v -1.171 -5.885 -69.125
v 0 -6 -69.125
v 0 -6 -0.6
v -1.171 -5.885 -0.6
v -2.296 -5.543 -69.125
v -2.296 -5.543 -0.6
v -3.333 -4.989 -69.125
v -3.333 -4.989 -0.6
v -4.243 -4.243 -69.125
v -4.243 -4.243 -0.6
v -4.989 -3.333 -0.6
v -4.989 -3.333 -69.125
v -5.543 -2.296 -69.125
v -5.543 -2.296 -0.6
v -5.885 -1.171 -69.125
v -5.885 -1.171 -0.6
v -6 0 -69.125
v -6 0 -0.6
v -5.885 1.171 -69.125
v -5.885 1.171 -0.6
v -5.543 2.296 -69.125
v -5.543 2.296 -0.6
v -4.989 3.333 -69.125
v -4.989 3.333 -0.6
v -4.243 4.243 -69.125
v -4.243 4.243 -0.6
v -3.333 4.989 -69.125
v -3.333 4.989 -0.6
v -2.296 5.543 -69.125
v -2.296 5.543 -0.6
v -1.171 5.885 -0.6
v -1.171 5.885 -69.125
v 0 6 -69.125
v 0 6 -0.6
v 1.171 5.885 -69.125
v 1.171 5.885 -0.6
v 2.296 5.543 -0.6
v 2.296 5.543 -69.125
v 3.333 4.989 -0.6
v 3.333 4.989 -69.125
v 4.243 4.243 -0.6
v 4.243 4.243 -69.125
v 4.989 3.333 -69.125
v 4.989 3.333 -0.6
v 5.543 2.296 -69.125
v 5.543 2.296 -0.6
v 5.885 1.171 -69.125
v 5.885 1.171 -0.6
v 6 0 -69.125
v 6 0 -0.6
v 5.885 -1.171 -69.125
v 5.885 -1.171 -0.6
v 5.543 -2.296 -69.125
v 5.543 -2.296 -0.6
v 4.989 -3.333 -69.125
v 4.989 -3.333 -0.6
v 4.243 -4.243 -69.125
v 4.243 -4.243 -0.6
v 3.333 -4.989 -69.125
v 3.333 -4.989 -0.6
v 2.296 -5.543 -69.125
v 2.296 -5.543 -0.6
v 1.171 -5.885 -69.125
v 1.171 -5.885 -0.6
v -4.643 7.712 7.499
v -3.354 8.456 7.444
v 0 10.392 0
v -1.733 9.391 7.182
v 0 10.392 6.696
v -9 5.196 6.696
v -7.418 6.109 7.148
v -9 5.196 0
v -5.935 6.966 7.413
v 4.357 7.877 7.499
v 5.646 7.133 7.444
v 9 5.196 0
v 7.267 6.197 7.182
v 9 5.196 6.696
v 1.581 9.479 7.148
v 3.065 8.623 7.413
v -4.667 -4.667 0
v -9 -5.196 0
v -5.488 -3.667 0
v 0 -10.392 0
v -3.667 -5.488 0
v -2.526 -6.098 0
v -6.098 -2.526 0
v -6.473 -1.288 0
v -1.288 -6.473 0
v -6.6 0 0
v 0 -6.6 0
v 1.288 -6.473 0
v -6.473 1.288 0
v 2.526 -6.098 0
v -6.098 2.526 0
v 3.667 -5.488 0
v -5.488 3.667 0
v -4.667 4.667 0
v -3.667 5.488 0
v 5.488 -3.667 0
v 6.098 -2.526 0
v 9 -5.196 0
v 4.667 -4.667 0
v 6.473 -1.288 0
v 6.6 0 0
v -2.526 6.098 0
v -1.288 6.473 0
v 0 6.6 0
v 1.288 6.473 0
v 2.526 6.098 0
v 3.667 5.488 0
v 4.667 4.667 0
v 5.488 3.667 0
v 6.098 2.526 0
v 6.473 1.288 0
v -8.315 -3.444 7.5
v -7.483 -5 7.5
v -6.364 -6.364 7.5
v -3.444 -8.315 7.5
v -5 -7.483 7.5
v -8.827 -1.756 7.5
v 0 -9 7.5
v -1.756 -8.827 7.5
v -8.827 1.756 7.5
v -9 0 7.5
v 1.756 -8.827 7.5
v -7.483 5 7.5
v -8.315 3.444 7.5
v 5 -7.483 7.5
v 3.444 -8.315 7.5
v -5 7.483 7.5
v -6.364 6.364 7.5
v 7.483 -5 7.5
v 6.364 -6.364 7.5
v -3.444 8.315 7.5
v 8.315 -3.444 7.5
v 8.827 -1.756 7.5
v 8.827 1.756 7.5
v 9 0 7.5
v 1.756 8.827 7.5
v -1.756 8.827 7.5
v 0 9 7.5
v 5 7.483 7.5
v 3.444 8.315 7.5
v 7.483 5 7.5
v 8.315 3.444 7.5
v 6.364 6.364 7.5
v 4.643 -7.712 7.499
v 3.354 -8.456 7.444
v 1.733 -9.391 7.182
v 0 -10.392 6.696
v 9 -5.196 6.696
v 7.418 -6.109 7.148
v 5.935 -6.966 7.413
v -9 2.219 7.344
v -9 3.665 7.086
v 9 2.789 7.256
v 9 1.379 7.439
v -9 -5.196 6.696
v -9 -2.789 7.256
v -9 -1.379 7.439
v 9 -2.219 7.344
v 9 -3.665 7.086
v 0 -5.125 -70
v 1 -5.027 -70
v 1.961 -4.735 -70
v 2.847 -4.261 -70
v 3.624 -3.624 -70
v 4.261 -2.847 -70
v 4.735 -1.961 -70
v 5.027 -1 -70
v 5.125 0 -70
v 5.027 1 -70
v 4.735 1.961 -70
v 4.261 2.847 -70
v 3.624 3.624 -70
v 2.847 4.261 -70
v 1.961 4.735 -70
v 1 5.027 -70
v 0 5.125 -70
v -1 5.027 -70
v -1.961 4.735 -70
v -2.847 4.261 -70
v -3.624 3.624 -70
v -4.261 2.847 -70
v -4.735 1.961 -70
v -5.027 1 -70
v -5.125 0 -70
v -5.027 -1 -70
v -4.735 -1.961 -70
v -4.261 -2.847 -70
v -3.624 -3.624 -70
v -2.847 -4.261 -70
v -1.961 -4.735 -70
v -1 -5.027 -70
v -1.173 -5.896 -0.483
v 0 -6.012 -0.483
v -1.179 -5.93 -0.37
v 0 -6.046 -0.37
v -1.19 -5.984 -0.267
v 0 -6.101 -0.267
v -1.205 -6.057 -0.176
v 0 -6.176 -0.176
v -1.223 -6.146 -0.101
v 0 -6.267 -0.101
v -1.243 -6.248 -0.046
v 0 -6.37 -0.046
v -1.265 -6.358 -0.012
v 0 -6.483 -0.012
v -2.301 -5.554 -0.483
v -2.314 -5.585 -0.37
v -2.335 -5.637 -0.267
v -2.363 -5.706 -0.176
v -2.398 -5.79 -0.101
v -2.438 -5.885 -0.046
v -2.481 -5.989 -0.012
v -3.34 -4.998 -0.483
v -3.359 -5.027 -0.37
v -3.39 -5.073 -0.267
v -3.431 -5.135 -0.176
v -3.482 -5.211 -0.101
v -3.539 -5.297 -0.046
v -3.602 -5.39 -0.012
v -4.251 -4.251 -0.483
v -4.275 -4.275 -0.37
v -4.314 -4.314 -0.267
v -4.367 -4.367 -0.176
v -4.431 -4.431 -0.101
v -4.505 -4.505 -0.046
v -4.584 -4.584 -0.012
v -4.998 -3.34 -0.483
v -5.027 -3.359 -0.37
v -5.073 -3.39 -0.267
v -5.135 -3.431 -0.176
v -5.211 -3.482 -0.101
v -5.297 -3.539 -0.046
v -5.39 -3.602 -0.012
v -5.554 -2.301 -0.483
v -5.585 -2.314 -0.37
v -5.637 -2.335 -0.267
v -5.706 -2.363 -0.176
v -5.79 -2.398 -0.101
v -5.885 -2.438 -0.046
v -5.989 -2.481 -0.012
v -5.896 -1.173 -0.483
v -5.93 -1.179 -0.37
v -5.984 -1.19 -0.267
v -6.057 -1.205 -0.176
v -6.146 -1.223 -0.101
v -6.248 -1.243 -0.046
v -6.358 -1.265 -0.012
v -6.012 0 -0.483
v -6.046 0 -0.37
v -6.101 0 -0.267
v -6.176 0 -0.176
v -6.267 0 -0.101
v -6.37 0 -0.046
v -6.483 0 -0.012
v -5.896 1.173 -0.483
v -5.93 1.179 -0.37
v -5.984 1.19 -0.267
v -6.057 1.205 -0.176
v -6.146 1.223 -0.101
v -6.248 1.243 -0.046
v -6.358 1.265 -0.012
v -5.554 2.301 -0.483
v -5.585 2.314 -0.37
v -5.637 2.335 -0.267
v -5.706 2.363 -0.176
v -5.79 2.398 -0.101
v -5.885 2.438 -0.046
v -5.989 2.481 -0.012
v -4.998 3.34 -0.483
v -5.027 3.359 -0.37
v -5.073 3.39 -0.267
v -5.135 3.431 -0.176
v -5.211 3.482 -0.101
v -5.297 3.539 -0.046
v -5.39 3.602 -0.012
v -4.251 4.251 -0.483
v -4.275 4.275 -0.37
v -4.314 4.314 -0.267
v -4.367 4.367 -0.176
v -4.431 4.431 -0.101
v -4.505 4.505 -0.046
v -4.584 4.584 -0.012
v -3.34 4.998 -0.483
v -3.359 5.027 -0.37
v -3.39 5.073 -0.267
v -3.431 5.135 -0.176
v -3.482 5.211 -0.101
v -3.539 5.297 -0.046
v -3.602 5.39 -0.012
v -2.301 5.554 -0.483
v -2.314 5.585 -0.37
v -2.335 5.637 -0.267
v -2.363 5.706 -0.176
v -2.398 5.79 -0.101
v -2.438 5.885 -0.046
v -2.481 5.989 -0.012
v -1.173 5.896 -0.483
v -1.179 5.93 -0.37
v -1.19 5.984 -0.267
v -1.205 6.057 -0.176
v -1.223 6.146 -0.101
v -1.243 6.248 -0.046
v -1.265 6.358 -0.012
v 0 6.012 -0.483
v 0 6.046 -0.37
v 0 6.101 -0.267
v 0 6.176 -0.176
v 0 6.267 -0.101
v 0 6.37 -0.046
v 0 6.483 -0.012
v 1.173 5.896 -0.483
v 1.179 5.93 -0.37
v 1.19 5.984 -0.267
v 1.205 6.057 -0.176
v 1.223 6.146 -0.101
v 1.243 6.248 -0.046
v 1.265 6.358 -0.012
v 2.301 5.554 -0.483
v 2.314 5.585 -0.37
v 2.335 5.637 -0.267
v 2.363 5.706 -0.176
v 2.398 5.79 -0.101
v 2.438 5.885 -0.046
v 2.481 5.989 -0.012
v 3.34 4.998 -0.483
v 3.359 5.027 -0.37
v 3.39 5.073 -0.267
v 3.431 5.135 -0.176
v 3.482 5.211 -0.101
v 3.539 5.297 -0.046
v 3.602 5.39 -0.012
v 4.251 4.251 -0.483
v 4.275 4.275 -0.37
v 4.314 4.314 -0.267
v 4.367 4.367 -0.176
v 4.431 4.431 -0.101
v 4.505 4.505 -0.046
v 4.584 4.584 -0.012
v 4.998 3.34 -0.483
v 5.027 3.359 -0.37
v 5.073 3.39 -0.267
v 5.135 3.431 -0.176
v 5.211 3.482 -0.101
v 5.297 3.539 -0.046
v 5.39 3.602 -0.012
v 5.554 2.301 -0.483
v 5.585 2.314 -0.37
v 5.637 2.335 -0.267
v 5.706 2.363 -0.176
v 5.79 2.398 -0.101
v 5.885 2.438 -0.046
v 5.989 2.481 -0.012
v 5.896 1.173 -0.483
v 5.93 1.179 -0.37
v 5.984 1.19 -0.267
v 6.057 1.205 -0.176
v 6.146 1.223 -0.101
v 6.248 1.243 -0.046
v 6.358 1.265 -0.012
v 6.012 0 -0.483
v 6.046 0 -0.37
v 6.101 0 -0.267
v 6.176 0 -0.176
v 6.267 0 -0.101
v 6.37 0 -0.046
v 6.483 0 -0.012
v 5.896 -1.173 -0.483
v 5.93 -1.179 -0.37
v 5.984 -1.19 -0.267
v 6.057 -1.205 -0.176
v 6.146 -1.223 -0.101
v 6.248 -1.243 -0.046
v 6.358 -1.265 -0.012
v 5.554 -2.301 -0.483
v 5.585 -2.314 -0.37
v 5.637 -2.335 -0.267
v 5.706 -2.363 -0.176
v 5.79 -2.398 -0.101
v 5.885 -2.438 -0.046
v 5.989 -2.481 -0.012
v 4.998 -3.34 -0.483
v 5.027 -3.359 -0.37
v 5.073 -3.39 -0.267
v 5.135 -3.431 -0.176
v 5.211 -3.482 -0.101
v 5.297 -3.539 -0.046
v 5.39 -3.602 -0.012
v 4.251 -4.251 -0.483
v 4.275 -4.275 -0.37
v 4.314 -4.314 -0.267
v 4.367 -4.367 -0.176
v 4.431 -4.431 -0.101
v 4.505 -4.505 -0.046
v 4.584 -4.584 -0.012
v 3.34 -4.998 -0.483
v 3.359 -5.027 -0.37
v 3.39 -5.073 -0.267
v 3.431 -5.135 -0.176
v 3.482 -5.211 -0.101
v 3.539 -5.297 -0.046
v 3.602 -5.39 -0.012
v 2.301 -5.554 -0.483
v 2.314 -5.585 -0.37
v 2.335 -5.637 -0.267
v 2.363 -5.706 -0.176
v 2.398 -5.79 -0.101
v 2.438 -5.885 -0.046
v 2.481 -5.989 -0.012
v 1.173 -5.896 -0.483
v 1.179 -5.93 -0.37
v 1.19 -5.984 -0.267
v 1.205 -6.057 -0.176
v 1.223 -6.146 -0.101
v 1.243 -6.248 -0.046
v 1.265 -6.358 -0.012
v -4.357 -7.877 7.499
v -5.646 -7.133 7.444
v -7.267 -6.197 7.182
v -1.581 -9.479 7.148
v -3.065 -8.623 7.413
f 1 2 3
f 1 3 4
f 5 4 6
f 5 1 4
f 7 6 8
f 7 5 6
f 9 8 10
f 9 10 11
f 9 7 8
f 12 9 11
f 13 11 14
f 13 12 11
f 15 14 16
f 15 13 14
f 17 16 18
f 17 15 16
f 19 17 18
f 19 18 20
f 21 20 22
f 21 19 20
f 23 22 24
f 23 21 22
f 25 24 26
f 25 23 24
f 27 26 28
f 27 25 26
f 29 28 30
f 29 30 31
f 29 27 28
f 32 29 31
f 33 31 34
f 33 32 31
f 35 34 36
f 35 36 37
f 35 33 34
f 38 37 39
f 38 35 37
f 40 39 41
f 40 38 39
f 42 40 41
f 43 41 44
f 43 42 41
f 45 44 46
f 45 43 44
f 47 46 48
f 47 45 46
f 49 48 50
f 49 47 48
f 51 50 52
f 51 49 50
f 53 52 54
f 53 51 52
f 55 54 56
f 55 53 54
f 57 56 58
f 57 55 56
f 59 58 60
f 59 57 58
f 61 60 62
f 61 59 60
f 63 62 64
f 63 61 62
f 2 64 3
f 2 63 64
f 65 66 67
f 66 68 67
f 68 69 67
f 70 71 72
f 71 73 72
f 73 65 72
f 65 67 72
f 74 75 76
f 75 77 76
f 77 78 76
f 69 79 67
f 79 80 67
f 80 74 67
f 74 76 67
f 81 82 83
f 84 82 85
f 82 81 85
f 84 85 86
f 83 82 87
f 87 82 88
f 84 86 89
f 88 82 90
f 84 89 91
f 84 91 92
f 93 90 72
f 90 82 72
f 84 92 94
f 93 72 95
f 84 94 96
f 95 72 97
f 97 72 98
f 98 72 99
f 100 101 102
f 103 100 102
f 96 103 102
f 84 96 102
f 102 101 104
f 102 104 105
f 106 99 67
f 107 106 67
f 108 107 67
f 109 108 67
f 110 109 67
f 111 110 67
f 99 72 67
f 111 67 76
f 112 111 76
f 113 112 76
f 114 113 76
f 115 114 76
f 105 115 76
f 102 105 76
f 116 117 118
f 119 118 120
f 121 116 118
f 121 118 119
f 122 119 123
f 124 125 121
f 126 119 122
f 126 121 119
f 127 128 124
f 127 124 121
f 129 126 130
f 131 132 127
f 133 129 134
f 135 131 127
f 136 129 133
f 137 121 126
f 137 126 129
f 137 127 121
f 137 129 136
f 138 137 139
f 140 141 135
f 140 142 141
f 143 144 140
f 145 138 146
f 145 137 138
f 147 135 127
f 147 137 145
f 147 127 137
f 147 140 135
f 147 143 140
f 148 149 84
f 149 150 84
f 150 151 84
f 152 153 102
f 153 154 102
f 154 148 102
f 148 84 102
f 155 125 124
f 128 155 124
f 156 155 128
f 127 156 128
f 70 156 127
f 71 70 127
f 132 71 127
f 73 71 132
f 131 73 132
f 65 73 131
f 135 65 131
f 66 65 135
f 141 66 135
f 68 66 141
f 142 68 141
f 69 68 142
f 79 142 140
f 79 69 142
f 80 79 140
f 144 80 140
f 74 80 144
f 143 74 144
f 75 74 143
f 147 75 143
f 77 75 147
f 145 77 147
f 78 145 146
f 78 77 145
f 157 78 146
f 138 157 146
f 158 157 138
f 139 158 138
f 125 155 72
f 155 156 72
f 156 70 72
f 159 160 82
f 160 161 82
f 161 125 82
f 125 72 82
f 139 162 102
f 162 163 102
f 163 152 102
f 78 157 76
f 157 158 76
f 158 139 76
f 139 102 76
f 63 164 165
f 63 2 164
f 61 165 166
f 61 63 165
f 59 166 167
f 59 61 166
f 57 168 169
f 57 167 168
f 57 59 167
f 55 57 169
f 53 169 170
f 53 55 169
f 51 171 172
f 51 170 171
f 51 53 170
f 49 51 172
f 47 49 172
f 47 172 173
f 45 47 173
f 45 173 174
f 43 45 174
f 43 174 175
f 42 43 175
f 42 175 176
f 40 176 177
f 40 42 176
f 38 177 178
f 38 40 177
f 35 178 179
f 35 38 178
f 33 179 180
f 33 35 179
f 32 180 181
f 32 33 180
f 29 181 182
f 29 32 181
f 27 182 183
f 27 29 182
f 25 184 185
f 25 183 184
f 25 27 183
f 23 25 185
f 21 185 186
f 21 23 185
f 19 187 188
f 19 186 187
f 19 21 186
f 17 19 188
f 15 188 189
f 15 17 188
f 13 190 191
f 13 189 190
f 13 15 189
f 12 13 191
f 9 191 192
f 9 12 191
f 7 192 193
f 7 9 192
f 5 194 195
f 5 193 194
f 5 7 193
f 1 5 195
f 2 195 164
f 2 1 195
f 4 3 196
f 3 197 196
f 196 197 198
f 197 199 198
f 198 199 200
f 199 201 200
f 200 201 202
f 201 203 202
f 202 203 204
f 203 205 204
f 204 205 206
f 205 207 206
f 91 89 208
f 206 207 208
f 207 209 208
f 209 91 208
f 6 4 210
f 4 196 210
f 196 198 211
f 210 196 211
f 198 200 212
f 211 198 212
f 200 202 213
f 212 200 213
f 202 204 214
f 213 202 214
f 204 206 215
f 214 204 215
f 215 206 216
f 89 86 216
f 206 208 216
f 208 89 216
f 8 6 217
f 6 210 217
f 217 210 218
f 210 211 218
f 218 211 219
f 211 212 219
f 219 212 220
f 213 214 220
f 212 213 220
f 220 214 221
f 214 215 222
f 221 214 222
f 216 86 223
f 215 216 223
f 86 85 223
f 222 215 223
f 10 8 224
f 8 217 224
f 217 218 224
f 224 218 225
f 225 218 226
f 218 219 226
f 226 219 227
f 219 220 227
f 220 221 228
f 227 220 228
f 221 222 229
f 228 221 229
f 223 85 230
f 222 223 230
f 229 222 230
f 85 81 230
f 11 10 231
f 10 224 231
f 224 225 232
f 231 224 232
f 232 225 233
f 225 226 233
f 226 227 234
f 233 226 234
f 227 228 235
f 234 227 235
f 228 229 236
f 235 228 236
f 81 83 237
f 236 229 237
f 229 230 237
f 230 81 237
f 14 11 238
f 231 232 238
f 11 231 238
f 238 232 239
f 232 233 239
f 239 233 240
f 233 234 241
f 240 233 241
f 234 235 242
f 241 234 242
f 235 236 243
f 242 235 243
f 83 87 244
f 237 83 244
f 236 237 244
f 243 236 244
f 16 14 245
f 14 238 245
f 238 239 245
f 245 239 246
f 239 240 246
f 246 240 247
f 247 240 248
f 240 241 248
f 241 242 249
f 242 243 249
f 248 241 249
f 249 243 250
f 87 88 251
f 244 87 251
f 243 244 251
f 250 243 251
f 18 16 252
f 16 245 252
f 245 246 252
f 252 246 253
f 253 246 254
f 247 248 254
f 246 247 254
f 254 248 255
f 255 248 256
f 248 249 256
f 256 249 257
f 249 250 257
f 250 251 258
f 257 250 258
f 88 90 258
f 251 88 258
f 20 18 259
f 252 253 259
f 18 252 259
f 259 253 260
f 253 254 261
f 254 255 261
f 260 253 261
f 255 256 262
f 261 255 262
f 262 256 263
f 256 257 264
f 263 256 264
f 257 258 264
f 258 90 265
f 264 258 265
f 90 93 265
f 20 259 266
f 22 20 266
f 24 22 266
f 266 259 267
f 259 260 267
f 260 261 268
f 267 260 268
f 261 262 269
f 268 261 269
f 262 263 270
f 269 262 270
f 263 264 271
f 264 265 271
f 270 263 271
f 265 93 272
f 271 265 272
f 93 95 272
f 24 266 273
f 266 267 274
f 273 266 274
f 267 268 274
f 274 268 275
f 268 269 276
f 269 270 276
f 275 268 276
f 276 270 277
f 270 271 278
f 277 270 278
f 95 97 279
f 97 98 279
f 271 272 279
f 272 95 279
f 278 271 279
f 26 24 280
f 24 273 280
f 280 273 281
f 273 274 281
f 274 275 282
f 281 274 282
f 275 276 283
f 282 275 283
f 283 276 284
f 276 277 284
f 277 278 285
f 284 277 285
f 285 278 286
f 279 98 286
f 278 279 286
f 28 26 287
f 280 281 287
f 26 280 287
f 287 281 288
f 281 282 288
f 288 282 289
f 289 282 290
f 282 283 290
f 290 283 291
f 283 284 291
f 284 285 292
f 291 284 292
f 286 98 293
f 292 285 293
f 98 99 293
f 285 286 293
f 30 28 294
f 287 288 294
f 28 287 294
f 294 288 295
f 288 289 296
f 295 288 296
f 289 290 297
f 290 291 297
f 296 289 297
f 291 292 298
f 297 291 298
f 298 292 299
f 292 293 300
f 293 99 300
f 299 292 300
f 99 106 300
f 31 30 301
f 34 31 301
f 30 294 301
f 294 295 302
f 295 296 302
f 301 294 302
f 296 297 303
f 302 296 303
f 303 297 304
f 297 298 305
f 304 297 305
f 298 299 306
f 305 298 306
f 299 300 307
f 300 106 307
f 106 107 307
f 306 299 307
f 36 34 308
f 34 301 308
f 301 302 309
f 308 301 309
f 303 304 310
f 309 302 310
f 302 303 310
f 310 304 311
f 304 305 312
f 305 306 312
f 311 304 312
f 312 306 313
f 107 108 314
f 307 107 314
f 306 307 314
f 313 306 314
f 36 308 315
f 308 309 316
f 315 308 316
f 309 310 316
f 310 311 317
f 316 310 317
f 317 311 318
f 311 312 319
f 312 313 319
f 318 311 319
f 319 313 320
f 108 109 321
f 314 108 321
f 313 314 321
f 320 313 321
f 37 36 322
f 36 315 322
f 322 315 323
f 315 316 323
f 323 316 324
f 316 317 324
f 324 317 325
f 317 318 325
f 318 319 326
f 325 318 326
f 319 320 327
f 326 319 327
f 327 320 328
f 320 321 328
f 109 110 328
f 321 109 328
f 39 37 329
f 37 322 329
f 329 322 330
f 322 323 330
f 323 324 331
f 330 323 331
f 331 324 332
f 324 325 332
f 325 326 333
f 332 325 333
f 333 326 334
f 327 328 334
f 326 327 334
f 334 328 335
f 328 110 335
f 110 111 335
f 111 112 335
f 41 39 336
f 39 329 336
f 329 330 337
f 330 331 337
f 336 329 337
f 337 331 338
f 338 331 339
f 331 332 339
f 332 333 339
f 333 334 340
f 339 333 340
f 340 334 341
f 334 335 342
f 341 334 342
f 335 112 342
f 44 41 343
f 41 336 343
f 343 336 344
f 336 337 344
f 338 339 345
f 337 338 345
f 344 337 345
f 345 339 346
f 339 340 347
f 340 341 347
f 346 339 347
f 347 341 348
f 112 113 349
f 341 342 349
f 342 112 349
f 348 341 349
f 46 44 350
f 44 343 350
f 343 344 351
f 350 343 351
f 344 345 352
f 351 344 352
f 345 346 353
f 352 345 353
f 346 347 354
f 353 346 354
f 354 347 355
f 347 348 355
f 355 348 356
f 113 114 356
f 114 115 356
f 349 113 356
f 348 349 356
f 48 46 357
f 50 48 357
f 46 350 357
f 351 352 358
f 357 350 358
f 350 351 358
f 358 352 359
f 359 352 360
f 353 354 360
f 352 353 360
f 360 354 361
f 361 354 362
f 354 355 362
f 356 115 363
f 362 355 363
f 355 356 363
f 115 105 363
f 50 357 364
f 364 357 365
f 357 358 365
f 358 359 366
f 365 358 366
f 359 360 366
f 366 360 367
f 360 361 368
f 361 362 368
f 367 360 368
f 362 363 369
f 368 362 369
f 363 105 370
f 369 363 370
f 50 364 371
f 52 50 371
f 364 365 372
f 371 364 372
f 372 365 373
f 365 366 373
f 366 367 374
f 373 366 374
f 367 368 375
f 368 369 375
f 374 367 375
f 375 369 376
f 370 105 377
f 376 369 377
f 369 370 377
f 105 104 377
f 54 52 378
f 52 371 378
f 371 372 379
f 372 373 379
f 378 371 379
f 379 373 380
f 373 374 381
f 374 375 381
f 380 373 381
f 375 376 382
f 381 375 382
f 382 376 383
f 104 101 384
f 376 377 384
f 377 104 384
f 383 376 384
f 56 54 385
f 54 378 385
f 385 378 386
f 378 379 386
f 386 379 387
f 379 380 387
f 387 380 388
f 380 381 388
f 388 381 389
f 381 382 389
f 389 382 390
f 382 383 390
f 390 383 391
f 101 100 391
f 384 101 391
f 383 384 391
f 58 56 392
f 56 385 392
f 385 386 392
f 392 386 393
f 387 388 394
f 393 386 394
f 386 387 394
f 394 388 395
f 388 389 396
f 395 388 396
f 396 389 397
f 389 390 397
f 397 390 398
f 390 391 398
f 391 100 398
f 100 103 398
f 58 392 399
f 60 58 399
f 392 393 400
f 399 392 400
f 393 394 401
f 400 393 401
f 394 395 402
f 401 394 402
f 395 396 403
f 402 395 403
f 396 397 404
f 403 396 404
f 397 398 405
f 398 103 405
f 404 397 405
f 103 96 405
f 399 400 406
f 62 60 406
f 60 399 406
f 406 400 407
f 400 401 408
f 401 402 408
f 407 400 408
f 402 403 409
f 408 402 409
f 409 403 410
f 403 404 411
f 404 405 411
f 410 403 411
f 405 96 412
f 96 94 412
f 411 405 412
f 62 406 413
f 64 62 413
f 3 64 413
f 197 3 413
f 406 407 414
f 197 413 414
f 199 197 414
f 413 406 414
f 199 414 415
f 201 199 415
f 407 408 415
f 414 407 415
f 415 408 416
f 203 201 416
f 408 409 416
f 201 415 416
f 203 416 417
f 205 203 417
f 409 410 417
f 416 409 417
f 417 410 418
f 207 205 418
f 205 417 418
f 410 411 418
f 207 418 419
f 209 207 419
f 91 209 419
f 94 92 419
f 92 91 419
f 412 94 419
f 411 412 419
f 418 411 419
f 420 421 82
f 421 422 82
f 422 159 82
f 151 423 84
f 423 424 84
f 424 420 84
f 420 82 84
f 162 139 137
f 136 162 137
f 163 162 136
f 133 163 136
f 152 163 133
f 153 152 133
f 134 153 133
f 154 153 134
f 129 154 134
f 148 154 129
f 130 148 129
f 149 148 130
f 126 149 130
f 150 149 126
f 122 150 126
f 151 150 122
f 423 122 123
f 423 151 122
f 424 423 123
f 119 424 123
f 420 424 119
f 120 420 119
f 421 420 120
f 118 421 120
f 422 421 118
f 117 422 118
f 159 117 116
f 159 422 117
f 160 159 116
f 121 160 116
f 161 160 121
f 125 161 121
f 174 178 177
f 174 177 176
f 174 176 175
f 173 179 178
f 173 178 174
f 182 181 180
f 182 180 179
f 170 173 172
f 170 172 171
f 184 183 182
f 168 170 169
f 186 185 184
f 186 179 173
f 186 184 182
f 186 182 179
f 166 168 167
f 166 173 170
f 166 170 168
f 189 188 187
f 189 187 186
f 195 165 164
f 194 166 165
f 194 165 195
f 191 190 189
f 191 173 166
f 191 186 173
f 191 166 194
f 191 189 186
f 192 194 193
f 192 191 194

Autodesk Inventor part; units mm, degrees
ref_plane "WorkPlane1" through (0, 0, 0) normal (0, 0, 1) x (1, 0, 0)
sketch "Sketch1" plane through (0, 0, 0) normal (0, 0, 1) x (1, 0, 0)
  point P0 (0, 0)
sketch "Sketch2" plane through (0, 0, 0) normal (0, 0, 1) x (1, 0, 0)
  line L0 (-9, 5.1963) -> (-9, -5.1963)
  line L1 (0, 10.3922) -> (-9, 5.1963)
  line L2 (9, 5.1963) -> (0, 10.3922)
  line L3 (9, -5.1963) -> (9, 5.1963)
  line L4 (0, -10.3922) -> (9, -5.1963)
  line L5 (-9, -5.1963) -> (0, -10.3922)
  circle A0 centre (0, 0) radius 9 construction
  dimension "d1" = 18
  dimension "d29" = 0
  dimension "d30" = 0
extrude "Extrusion1" add sketch "Sketch2" along normal blind 7.5
sketch "Sketch3" plane through (0, 0, 0) normal (1, 0, 0) x (0, 1, 0)
  line L0 (9, 7.5) -> (10.4922, 7.5)
  line L1 (10.4922, 6.6385) -> (9, 7.5)
  line L2 (10.4922, 7.5) -> (10.4922, 6.6385)
  line L3 (0, -1.5) -> (0, 9) projected
  line L4 (10.3922, 0) -> (10.3922, 7.5) projected
  dimension "d25" = 0.1
  dimension "d26" = 0
  dimension "d27" = 60
  dimension "d28" = 9
revolve "Revolution1" cut sketch "Sketch3" angle 360 about axis through (0, 0, -10) along (0, 0, 1)
sketch "Sketch4" plane through (0, 0, 0) normal (1, 0, 0) x (0, 1, 0)
  line L0 (0, -70) -> (0, 0)
  line L1 (-6, -70) -> (0, -70)
  line L2 (-6, 0) -> (-6, -70)
  line L3 (0, 0) -> (-6, 0)
  line L4 (0, -70) -> (0, 0)
  line L5 (-7.2, 0) -> (1.2, 0) projected
  line L6 (0, -84) -> (0, 14) projected
  dimension "d18" = 6
  dimension "d20" = 70
  dimension "d33" = 0
  dimension "d34" = 0
revolve "Revolution2" add sketch "Sketch4" angle 360 about axis through (0, 0, -70) along (0, 0, -1)
chamfer "Chamfer1" distance 0.875 angle 45 1 edges at (0, 6, -70)
fillet "Fillet1" radius 0.6 1 edges at (0, 6, 0)
thread "Thread1" size "M12x1.75" class "6g" standard "ISO Metric profile" length 66.5
ref_plane "MSC_PF1" through (0, 0, 0) normal (1, 0, 0) x (0, 1, 0)
ref_plane "MSC_PT1" through (0, 0, 0) normal (0, 0, -1) x (-1, 0, 0)
equation "\"d22\" = 0.5 * PTC"
equation "\"d23\" = 0.5 * PTC"
equation "\"d24\" = r"
equation "\"d1\" = ParS"
equation "\"d6\" = ParK"
equation "\"b\" = NLG - 2 * PTC"
equation "\"d28\" = 0.5 * ParS"
equation "\"d18\" = 0.5 * NND"
equation "\"d20\" = NLG"
equation "\"NND\" = 12"
equation "\"NLG\" = 70"
equation "\"PTC\" = 1.75"
equation "\"ParK\" = 7.5"
equation "\"ParS\" = 18"
equation "\"msp_es\" = 0.577367 * ParS"
equation "\"r\" = 0.6"
equation "\"THREADDIA\" = NND"
properties part number "ISO 4018 - M12 x 70" material "Steel"
